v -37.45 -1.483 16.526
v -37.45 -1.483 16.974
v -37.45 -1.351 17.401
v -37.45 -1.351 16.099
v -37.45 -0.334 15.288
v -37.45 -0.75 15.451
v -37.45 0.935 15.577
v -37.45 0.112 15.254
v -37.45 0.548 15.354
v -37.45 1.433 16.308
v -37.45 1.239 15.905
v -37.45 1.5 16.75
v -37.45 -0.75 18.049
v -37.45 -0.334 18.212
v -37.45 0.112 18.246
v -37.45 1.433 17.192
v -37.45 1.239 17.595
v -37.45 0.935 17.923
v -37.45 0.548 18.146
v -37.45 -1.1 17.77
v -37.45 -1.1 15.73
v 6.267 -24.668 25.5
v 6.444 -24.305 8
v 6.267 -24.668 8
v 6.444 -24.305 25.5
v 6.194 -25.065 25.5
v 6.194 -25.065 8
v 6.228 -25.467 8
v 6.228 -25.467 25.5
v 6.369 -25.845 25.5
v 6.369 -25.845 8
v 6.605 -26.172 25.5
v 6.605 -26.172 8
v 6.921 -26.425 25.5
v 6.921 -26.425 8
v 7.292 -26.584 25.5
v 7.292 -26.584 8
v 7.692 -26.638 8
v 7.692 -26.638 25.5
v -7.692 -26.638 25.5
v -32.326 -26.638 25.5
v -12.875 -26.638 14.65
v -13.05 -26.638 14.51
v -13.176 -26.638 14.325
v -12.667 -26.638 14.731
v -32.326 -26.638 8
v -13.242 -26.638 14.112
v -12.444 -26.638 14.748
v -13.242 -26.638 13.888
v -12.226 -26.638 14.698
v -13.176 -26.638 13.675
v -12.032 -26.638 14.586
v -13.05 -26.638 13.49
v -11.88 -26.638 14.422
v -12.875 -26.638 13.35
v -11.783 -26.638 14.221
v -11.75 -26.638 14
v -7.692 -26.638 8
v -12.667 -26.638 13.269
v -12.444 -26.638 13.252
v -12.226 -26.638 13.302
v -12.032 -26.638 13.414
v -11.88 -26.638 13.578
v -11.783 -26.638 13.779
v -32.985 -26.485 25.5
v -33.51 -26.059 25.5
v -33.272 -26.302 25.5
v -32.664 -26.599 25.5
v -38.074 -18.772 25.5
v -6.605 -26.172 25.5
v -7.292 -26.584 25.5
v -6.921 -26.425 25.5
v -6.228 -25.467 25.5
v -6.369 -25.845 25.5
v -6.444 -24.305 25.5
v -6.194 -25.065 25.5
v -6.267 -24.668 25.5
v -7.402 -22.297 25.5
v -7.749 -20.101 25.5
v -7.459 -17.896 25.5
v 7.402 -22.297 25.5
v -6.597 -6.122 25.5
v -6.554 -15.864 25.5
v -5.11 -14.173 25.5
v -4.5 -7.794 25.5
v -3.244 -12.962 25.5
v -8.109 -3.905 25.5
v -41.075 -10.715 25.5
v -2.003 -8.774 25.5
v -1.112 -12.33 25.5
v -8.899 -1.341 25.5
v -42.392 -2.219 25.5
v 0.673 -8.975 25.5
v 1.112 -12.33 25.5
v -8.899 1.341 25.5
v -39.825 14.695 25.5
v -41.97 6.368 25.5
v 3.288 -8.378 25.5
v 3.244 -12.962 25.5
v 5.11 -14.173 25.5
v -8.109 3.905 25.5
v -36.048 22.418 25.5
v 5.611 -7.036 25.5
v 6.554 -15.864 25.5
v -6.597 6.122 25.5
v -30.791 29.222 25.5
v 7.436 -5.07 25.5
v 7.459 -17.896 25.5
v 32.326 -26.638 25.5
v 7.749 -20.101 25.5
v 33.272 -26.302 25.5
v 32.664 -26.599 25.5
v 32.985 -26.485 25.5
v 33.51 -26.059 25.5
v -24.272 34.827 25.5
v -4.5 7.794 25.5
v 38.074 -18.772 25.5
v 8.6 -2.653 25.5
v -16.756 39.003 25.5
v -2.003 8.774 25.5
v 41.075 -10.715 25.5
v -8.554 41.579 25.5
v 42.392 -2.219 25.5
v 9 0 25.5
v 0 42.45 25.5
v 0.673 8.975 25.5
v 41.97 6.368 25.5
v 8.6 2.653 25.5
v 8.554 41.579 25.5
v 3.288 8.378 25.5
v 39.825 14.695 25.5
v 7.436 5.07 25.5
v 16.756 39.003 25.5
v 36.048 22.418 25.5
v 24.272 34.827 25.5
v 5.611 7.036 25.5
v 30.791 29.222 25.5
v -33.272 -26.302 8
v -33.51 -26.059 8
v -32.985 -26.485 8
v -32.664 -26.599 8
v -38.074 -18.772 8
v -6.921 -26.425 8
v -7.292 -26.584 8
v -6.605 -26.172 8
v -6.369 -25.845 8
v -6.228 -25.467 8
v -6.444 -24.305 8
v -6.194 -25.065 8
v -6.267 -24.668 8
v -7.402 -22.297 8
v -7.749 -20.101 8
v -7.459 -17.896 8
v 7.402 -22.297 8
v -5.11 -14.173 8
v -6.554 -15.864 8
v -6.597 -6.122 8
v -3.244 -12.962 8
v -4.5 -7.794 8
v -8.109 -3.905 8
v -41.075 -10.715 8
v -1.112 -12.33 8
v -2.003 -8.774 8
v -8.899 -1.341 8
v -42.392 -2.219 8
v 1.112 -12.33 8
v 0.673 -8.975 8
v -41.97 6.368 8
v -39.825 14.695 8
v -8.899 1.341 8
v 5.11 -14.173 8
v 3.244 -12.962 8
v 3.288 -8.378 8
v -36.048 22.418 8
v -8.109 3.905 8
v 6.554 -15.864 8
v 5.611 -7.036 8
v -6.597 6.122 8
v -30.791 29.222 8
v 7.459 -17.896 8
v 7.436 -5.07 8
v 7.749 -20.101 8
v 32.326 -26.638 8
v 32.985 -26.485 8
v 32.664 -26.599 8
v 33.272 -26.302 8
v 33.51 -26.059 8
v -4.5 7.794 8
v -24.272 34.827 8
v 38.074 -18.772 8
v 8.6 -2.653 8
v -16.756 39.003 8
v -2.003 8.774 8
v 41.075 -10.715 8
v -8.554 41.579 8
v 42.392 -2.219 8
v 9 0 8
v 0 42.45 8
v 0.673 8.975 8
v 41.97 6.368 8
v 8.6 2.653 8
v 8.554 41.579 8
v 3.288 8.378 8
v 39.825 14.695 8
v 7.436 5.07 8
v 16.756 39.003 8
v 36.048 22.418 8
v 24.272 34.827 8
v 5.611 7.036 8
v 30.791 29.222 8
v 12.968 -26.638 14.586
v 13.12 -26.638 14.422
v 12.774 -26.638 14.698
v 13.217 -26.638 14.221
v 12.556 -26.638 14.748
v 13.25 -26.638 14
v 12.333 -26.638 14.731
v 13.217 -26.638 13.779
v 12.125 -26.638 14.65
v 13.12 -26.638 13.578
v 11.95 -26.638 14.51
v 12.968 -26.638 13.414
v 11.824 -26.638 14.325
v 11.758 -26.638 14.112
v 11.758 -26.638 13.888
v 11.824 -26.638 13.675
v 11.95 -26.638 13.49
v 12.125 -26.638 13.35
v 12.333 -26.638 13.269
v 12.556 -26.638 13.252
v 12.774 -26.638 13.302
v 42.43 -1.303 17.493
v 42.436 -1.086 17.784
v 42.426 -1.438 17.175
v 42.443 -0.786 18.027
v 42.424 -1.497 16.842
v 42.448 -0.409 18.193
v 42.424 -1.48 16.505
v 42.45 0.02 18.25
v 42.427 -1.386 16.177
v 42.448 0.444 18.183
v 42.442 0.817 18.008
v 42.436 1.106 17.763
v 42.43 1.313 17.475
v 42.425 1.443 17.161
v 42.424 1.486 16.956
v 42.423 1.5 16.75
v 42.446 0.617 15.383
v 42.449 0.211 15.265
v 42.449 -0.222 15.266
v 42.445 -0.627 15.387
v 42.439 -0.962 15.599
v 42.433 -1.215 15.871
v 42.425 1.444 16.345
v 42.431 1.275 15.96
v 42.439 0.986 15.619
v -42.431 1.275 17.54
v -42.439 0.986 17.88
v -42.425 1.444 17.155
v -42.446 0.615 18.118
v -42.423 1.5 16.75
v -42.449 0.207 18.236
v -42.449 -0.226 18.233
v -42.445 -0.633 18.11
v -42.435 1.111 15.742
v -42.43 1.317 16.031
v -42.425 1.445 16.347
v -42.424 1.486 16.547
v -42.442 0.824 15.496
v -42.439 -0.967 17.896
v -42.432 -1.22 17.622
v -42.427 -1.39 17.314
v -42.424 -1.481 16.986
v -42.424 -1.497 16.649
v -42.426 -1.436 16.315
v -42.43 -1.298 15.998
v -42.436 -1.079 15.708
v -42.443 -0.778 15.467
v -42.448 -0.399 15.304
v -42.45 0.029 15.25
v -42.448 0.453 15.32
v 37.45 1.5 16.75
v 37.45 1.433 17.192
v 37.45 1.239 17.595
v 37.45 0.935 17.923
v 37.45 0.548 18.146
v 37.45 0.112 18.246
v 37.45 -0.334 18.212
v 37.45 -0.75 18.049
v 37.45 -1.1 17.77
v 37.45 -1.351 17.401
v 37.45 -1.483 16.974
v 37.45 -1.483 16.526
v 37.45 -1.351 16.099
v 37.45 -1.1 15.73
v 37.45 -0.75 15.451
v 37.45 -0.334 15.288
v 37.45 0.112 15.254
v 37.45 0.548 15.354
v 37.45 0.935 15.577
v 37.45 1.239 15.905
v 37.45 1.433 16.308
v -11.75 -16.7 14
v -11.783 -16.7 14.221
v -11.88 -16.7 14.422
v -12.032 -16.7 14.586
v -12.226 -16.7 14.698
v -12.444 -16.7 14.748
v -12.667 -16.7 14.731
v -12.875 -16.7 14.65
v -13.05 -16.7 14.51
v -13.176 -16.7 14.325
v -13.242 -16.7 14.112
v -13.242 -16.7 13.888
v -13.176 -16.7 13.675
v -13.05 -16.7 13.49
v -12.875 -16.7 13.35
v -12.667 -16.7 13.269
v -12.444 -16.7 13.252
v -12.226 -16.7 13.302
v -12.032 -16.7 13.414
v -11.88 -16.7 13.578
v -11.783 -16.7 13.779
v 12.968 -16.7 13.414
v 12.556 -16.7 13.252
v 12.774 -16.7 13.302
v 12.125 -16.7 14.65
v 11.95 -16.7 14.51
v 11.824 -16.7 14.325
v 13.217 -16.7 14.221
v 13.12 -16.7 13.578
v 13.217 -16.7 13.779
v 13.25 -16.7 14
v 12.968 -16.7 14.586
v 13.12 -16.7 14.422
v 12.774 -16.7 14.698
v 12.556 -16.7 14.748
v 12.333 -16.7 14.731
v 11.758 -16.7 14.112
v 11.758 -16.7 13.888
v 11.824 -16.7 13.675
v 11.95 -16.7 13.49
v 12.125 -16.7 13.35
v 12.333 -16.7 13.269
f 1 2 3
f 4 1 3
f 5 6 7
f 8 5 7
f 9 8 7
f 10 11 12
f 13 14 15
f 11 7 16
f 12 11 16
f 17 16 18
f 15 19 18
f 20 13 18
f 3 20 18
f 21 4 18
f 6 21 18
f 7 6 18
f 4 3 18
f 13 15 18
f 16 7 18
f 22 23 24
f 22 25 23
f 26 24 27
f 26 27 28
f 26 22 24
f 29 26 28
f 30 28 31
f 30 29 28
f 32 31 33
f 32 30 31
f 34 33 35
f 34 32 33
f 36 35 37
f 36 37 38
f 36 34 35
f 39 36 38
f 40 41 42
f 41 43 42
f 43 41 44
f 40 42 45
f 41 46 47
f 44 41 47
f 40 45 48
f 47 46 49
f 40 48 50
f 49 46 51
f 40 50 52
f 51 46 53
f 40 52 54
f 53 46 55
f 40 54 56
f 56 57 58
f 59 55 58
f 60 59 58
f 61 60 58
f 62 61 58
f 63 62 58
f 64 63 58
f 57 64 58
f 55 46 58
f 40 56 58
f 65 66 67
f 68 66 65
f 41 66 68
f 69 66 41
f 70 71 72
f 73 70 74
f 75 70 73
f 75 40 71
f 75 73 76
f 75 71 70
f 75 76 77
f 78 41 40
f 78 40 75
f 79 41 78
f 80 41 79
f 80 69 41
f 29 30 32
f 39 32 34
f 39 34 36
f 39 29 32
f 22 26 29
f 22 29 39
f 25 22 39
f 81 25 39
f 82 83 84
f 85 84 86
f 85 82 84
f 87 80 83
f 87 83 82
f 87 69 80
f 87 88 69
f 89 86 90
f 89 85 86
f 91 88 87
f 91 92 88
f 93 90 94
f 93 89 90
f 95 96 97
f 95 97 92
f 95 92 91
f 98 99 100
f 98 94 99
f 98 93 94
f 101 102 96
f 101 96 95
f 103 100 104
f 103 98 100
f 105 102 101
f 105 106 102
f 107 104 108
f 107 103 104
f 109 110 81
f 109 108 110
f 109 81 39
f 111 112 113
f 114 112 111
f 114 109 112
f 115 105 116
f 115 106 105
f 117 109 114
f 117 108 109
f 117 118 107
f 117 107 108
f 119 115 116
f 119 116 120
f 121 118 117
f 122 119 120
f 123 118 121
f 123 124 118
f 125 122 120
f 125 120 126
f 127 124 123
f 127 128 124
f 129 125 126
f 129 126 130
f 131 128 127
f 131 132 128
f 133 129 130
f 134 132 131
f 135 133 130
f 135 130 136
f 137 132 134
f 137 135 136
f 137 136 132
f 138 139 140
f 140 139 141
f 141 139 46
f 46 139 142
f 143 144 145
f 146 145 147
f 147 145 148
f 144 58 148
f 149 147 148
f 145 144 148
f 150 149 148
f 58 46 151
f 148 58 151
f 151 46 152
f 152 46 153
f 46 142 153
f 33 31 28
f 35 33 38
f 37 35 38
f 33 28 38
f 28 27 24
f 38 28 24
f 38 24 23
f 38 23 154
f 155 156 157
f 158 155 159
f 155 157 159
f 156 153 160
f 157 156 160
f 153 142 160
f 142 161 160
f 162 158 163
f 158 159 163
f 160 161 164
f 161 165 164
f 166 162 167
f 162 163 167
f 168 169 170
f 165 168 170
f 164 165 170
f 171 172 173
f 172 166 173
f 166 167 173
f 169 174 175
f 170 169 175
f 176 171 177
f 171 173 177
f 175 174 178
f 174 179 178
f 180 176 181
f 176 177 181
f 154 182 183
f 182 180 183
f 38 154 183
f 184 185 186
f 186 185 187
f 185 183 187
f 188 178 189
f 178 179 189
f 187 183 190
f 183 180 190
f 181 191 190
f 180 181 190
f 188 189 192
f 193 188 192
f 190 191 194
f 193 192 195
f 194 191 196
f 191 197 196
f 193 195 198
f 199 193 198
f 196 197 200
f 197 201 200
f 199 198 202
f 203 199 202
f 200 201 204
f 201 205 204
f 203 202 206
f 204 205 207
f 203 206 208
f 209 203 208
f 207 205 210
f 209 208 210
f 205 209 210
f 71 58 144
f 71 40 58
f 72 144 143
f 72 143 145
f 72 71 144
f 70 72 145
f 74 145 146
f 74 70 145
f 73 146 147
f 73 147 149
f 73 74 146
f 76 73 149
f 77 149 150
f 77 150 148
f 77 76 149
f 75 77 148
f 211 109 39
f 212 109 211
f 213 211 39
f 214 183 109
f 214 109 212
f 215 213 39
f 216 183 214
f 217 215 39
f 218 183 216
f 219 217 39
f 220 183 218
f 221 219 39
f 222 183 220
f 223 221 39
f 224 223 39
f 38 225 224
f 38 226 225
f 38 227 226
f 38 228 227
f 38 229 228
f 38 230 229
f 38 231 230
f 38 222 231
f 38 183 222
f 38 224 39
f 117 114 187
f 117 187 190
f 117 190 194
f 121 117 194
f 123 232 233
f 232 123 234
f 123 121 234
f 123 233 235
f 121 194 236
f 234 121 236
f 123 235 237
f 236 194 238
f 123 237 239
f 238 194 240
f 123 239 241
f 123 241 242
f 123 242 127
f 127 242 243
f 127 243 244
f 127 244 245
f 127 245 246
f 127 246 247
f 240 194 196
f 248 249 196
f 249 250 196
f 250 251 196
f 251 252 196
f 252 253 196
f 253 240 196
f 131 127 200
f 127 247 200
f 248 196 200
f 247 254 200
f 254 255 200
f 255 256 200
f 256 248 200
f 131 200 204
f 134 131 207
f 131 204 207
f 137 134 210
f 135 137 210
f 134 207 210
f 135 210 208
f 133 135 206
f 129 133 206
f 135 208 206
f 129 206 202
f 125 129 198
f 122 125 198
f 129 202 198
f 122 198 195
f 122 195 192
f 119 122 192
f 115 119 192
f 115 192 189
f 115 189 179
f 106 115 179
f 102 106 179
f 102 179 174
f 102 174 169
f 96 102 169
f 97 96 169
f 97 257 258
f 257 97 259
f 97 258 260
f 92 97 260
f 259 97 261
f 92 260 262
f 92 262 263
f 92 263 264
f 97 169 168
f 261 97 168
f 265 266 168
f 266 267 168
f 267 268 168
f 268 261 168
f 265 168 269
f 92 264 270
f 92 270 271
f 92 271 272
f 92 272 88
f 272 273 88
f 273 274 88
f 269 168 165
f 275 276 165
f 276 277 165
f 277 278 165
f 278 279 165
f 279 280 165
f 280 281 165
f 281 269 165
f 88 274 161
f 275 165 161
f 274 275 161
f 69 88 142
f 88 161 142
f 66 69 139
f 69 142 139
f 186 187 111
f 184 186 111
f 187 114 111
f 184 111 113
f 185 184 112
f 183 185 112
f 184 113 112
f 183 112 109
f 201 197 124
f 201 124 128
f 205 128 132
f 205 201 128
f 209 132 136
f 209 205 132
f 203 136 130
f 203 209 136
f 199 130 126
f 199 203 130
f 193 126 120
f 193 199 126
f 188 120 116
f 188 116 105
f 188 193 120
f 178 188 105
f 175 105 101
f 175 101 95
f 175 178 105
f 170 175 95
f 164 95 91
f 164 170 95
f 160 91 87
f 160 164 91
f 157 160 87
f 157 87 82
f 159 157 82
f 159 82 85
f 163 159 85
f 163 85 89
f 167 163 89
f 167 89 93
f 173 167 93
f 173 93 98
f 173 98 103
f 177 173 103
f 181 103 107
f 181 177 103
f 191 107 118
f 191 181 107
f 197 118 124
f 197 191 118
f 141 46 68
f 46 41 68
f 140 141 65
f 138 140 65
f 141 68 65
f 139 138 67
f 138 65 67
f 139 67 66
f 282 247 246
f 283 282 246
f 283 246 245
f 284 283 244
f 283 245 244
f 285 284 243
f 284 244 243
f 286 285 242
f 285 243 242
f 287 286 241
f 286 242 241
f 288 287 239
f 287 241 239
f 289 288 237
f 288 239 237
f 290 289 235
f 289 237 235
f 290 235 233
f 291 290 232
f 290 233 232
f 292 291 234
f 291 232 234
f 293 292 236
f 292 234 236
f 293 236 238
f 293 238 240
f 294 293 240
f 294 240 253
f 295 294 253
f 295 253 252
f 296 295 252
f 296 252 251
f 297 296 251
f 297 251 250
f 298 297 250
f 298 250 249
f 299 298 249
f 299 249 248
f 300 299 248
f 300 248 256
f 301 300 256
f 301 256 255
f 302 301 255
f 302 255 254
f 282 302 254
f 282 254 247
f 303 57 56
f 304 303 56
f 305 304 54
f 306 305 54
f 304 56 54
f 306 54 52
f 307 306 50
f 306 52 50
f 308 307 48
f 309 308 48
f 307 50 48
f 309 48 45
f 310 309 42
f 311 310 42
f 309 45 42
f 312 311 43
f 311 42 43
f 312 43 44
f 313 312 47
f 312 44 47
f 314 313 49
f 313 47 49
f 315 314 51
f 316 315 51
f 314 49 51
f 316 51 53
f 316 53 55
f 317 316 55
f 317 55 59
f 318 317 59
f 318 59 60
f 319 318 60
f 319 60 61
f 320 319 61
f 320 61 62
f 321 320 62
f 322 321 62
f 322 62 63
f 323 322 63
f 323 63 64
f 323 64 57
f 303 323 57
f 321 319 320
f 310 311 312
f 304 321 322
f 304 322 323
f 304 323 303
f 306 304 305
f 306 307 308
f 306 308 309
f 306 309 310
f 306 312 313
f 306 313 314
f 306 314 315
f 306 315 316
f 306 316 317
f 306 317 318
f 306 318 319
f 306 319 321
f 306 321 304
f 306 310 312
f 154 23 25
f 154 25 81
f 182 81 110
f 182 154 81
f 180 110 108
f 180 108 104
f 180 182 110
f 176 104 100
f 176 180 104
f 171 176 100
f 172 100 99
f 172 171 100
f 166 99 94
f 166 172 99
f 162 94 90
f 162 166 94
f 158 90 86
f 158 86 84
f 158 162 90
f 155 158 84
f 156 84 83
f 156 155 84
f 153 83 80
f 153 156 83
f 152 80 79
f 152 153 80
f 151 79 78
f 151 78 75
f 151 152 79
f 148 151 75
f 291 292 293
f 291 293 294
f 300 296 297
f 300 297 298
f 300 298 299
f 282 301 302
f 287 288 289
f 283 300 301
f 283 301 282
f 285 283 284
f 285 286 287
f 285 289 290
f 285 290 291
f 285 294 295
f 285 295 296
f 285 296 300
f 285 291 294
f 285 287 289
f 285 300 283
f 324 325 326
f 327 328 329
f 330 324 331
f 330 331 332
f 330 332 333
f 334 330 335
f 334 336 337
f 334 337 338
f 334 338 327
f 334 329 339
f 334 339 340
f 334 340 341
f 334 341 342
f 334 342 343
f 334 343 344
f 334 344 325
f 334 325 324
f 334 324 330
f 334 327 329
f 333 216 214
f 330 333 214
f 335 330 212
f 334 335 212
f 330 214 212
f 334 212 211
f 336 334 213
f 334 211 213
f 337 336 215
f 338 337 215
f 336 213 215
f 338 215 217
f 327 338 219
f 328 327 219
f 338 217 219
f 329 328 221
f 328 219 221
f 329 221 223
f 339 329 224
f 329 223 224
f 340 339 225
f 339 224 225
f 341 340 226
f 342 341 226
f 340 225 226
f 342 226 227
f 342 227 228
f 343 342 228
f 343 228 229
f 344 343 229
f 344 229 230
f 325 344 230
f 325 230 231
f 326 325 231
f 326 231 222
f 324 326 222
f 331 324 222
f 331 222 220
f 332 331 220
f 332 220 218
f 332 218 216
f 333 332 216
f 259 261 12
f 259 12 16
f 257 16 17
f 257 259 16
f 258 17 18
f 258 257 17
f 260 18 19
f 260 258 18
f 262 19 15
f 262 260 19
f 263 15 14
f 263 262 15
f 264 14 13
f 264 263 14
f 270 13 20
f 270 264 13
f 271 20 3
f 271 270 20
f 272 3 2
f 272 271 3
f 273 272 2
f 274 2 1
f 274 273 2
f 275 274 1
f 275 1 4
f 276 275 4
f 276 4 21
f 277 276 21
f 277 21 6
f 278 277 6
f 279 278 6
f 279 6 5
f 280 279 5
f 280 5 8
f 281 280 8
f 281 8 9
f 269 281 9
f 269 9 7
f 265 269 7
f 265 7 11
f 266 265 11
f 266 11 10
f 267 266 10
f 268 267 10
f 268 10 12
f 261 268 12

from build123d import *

# Parameters (mm, degrees)
SKETCH007_R     = 9
PAD005_DEPTH    = 17.5
FILLET_R        = 1.5
SKETCH022_R     = 1.5
POCKET010_DEPTH = 5
SKETCH023_R     = 0.75
POCKET011_DEPTH = 10
SKETCH026_R     = 1.5
POCKET014_DEPTH = 5


with BuildPart() as part:
    # Sketch007 → Pad005 (new body)
    with BuildSketch(Plane.XY):
        with BuildLine():
            Line((-33.051802, -26.637959), (-4, -26.637959))
            ThreePointArc((4, -26.637959), (0, -12.25), (-4, -26.637959))
            Line((33.051802, -26.637959), (4, -26.637959))
            ThreePointArc((33.051802, -26.637959), (0, 42.45), (-33.051802, -26.637959))
        make_face()
        Circle(SKETCH007_R, mode=Mode.SUBTRACT)
    extrude(amount=PAD005_DEPTH)

    # Fillet
    fillet_edges = [part.edges().sort_by_distance(p)[0] for p in [
        (-4, -26.637959, 8.75),
        (4, -26.637959, 8.75),
        (-33.051802, -26.637959, 8.75),
        (33.051802, -26.637959, 8.75),
    ]]
    fillet(fillet_edges, radius=FILLET_R)

    # Sketch022 (on DatumPlane) → Pocket010 (cut)
    with BuildSketch(Plane.YZ.offset(42.45)):
        with Locations((0, 8.75)):
            Circle(SKETCH022_R)
    extrude(amount=-POCKET010_DEPTH, mode=Mode.SUBTRACT)

    # Sketch023 (on DatumPlane) → Pocket011 (cut)
    with BuildSketch(Plane.XZ.offset(26.7)):
        with Locations((12.5, 6)):
            Circle(SKETCH023_R)
        with Locations((-12.5, 6)):
            Circle(SKETCH023_R)
    extrude(amount=-POCKET011_DEPTH, mode=Mode.SUBTRACT)

    # Sketch026 (on DatumPlane) → Pocket014 (cut)
    with BuildSketch(Plane.YZ.offset(-42.45)):
        with Locations((0, 8.75)):
            Circle(SKETCH026_R)
    extrude(amount=POCKET014_DEPTH, mode=Mode.SUBTRACT)


with BuildPart() as part_1:
    # Body005 placement: moved
    add(part.part.moved(Location((0, 0, 8))))


solid = part_1.part
